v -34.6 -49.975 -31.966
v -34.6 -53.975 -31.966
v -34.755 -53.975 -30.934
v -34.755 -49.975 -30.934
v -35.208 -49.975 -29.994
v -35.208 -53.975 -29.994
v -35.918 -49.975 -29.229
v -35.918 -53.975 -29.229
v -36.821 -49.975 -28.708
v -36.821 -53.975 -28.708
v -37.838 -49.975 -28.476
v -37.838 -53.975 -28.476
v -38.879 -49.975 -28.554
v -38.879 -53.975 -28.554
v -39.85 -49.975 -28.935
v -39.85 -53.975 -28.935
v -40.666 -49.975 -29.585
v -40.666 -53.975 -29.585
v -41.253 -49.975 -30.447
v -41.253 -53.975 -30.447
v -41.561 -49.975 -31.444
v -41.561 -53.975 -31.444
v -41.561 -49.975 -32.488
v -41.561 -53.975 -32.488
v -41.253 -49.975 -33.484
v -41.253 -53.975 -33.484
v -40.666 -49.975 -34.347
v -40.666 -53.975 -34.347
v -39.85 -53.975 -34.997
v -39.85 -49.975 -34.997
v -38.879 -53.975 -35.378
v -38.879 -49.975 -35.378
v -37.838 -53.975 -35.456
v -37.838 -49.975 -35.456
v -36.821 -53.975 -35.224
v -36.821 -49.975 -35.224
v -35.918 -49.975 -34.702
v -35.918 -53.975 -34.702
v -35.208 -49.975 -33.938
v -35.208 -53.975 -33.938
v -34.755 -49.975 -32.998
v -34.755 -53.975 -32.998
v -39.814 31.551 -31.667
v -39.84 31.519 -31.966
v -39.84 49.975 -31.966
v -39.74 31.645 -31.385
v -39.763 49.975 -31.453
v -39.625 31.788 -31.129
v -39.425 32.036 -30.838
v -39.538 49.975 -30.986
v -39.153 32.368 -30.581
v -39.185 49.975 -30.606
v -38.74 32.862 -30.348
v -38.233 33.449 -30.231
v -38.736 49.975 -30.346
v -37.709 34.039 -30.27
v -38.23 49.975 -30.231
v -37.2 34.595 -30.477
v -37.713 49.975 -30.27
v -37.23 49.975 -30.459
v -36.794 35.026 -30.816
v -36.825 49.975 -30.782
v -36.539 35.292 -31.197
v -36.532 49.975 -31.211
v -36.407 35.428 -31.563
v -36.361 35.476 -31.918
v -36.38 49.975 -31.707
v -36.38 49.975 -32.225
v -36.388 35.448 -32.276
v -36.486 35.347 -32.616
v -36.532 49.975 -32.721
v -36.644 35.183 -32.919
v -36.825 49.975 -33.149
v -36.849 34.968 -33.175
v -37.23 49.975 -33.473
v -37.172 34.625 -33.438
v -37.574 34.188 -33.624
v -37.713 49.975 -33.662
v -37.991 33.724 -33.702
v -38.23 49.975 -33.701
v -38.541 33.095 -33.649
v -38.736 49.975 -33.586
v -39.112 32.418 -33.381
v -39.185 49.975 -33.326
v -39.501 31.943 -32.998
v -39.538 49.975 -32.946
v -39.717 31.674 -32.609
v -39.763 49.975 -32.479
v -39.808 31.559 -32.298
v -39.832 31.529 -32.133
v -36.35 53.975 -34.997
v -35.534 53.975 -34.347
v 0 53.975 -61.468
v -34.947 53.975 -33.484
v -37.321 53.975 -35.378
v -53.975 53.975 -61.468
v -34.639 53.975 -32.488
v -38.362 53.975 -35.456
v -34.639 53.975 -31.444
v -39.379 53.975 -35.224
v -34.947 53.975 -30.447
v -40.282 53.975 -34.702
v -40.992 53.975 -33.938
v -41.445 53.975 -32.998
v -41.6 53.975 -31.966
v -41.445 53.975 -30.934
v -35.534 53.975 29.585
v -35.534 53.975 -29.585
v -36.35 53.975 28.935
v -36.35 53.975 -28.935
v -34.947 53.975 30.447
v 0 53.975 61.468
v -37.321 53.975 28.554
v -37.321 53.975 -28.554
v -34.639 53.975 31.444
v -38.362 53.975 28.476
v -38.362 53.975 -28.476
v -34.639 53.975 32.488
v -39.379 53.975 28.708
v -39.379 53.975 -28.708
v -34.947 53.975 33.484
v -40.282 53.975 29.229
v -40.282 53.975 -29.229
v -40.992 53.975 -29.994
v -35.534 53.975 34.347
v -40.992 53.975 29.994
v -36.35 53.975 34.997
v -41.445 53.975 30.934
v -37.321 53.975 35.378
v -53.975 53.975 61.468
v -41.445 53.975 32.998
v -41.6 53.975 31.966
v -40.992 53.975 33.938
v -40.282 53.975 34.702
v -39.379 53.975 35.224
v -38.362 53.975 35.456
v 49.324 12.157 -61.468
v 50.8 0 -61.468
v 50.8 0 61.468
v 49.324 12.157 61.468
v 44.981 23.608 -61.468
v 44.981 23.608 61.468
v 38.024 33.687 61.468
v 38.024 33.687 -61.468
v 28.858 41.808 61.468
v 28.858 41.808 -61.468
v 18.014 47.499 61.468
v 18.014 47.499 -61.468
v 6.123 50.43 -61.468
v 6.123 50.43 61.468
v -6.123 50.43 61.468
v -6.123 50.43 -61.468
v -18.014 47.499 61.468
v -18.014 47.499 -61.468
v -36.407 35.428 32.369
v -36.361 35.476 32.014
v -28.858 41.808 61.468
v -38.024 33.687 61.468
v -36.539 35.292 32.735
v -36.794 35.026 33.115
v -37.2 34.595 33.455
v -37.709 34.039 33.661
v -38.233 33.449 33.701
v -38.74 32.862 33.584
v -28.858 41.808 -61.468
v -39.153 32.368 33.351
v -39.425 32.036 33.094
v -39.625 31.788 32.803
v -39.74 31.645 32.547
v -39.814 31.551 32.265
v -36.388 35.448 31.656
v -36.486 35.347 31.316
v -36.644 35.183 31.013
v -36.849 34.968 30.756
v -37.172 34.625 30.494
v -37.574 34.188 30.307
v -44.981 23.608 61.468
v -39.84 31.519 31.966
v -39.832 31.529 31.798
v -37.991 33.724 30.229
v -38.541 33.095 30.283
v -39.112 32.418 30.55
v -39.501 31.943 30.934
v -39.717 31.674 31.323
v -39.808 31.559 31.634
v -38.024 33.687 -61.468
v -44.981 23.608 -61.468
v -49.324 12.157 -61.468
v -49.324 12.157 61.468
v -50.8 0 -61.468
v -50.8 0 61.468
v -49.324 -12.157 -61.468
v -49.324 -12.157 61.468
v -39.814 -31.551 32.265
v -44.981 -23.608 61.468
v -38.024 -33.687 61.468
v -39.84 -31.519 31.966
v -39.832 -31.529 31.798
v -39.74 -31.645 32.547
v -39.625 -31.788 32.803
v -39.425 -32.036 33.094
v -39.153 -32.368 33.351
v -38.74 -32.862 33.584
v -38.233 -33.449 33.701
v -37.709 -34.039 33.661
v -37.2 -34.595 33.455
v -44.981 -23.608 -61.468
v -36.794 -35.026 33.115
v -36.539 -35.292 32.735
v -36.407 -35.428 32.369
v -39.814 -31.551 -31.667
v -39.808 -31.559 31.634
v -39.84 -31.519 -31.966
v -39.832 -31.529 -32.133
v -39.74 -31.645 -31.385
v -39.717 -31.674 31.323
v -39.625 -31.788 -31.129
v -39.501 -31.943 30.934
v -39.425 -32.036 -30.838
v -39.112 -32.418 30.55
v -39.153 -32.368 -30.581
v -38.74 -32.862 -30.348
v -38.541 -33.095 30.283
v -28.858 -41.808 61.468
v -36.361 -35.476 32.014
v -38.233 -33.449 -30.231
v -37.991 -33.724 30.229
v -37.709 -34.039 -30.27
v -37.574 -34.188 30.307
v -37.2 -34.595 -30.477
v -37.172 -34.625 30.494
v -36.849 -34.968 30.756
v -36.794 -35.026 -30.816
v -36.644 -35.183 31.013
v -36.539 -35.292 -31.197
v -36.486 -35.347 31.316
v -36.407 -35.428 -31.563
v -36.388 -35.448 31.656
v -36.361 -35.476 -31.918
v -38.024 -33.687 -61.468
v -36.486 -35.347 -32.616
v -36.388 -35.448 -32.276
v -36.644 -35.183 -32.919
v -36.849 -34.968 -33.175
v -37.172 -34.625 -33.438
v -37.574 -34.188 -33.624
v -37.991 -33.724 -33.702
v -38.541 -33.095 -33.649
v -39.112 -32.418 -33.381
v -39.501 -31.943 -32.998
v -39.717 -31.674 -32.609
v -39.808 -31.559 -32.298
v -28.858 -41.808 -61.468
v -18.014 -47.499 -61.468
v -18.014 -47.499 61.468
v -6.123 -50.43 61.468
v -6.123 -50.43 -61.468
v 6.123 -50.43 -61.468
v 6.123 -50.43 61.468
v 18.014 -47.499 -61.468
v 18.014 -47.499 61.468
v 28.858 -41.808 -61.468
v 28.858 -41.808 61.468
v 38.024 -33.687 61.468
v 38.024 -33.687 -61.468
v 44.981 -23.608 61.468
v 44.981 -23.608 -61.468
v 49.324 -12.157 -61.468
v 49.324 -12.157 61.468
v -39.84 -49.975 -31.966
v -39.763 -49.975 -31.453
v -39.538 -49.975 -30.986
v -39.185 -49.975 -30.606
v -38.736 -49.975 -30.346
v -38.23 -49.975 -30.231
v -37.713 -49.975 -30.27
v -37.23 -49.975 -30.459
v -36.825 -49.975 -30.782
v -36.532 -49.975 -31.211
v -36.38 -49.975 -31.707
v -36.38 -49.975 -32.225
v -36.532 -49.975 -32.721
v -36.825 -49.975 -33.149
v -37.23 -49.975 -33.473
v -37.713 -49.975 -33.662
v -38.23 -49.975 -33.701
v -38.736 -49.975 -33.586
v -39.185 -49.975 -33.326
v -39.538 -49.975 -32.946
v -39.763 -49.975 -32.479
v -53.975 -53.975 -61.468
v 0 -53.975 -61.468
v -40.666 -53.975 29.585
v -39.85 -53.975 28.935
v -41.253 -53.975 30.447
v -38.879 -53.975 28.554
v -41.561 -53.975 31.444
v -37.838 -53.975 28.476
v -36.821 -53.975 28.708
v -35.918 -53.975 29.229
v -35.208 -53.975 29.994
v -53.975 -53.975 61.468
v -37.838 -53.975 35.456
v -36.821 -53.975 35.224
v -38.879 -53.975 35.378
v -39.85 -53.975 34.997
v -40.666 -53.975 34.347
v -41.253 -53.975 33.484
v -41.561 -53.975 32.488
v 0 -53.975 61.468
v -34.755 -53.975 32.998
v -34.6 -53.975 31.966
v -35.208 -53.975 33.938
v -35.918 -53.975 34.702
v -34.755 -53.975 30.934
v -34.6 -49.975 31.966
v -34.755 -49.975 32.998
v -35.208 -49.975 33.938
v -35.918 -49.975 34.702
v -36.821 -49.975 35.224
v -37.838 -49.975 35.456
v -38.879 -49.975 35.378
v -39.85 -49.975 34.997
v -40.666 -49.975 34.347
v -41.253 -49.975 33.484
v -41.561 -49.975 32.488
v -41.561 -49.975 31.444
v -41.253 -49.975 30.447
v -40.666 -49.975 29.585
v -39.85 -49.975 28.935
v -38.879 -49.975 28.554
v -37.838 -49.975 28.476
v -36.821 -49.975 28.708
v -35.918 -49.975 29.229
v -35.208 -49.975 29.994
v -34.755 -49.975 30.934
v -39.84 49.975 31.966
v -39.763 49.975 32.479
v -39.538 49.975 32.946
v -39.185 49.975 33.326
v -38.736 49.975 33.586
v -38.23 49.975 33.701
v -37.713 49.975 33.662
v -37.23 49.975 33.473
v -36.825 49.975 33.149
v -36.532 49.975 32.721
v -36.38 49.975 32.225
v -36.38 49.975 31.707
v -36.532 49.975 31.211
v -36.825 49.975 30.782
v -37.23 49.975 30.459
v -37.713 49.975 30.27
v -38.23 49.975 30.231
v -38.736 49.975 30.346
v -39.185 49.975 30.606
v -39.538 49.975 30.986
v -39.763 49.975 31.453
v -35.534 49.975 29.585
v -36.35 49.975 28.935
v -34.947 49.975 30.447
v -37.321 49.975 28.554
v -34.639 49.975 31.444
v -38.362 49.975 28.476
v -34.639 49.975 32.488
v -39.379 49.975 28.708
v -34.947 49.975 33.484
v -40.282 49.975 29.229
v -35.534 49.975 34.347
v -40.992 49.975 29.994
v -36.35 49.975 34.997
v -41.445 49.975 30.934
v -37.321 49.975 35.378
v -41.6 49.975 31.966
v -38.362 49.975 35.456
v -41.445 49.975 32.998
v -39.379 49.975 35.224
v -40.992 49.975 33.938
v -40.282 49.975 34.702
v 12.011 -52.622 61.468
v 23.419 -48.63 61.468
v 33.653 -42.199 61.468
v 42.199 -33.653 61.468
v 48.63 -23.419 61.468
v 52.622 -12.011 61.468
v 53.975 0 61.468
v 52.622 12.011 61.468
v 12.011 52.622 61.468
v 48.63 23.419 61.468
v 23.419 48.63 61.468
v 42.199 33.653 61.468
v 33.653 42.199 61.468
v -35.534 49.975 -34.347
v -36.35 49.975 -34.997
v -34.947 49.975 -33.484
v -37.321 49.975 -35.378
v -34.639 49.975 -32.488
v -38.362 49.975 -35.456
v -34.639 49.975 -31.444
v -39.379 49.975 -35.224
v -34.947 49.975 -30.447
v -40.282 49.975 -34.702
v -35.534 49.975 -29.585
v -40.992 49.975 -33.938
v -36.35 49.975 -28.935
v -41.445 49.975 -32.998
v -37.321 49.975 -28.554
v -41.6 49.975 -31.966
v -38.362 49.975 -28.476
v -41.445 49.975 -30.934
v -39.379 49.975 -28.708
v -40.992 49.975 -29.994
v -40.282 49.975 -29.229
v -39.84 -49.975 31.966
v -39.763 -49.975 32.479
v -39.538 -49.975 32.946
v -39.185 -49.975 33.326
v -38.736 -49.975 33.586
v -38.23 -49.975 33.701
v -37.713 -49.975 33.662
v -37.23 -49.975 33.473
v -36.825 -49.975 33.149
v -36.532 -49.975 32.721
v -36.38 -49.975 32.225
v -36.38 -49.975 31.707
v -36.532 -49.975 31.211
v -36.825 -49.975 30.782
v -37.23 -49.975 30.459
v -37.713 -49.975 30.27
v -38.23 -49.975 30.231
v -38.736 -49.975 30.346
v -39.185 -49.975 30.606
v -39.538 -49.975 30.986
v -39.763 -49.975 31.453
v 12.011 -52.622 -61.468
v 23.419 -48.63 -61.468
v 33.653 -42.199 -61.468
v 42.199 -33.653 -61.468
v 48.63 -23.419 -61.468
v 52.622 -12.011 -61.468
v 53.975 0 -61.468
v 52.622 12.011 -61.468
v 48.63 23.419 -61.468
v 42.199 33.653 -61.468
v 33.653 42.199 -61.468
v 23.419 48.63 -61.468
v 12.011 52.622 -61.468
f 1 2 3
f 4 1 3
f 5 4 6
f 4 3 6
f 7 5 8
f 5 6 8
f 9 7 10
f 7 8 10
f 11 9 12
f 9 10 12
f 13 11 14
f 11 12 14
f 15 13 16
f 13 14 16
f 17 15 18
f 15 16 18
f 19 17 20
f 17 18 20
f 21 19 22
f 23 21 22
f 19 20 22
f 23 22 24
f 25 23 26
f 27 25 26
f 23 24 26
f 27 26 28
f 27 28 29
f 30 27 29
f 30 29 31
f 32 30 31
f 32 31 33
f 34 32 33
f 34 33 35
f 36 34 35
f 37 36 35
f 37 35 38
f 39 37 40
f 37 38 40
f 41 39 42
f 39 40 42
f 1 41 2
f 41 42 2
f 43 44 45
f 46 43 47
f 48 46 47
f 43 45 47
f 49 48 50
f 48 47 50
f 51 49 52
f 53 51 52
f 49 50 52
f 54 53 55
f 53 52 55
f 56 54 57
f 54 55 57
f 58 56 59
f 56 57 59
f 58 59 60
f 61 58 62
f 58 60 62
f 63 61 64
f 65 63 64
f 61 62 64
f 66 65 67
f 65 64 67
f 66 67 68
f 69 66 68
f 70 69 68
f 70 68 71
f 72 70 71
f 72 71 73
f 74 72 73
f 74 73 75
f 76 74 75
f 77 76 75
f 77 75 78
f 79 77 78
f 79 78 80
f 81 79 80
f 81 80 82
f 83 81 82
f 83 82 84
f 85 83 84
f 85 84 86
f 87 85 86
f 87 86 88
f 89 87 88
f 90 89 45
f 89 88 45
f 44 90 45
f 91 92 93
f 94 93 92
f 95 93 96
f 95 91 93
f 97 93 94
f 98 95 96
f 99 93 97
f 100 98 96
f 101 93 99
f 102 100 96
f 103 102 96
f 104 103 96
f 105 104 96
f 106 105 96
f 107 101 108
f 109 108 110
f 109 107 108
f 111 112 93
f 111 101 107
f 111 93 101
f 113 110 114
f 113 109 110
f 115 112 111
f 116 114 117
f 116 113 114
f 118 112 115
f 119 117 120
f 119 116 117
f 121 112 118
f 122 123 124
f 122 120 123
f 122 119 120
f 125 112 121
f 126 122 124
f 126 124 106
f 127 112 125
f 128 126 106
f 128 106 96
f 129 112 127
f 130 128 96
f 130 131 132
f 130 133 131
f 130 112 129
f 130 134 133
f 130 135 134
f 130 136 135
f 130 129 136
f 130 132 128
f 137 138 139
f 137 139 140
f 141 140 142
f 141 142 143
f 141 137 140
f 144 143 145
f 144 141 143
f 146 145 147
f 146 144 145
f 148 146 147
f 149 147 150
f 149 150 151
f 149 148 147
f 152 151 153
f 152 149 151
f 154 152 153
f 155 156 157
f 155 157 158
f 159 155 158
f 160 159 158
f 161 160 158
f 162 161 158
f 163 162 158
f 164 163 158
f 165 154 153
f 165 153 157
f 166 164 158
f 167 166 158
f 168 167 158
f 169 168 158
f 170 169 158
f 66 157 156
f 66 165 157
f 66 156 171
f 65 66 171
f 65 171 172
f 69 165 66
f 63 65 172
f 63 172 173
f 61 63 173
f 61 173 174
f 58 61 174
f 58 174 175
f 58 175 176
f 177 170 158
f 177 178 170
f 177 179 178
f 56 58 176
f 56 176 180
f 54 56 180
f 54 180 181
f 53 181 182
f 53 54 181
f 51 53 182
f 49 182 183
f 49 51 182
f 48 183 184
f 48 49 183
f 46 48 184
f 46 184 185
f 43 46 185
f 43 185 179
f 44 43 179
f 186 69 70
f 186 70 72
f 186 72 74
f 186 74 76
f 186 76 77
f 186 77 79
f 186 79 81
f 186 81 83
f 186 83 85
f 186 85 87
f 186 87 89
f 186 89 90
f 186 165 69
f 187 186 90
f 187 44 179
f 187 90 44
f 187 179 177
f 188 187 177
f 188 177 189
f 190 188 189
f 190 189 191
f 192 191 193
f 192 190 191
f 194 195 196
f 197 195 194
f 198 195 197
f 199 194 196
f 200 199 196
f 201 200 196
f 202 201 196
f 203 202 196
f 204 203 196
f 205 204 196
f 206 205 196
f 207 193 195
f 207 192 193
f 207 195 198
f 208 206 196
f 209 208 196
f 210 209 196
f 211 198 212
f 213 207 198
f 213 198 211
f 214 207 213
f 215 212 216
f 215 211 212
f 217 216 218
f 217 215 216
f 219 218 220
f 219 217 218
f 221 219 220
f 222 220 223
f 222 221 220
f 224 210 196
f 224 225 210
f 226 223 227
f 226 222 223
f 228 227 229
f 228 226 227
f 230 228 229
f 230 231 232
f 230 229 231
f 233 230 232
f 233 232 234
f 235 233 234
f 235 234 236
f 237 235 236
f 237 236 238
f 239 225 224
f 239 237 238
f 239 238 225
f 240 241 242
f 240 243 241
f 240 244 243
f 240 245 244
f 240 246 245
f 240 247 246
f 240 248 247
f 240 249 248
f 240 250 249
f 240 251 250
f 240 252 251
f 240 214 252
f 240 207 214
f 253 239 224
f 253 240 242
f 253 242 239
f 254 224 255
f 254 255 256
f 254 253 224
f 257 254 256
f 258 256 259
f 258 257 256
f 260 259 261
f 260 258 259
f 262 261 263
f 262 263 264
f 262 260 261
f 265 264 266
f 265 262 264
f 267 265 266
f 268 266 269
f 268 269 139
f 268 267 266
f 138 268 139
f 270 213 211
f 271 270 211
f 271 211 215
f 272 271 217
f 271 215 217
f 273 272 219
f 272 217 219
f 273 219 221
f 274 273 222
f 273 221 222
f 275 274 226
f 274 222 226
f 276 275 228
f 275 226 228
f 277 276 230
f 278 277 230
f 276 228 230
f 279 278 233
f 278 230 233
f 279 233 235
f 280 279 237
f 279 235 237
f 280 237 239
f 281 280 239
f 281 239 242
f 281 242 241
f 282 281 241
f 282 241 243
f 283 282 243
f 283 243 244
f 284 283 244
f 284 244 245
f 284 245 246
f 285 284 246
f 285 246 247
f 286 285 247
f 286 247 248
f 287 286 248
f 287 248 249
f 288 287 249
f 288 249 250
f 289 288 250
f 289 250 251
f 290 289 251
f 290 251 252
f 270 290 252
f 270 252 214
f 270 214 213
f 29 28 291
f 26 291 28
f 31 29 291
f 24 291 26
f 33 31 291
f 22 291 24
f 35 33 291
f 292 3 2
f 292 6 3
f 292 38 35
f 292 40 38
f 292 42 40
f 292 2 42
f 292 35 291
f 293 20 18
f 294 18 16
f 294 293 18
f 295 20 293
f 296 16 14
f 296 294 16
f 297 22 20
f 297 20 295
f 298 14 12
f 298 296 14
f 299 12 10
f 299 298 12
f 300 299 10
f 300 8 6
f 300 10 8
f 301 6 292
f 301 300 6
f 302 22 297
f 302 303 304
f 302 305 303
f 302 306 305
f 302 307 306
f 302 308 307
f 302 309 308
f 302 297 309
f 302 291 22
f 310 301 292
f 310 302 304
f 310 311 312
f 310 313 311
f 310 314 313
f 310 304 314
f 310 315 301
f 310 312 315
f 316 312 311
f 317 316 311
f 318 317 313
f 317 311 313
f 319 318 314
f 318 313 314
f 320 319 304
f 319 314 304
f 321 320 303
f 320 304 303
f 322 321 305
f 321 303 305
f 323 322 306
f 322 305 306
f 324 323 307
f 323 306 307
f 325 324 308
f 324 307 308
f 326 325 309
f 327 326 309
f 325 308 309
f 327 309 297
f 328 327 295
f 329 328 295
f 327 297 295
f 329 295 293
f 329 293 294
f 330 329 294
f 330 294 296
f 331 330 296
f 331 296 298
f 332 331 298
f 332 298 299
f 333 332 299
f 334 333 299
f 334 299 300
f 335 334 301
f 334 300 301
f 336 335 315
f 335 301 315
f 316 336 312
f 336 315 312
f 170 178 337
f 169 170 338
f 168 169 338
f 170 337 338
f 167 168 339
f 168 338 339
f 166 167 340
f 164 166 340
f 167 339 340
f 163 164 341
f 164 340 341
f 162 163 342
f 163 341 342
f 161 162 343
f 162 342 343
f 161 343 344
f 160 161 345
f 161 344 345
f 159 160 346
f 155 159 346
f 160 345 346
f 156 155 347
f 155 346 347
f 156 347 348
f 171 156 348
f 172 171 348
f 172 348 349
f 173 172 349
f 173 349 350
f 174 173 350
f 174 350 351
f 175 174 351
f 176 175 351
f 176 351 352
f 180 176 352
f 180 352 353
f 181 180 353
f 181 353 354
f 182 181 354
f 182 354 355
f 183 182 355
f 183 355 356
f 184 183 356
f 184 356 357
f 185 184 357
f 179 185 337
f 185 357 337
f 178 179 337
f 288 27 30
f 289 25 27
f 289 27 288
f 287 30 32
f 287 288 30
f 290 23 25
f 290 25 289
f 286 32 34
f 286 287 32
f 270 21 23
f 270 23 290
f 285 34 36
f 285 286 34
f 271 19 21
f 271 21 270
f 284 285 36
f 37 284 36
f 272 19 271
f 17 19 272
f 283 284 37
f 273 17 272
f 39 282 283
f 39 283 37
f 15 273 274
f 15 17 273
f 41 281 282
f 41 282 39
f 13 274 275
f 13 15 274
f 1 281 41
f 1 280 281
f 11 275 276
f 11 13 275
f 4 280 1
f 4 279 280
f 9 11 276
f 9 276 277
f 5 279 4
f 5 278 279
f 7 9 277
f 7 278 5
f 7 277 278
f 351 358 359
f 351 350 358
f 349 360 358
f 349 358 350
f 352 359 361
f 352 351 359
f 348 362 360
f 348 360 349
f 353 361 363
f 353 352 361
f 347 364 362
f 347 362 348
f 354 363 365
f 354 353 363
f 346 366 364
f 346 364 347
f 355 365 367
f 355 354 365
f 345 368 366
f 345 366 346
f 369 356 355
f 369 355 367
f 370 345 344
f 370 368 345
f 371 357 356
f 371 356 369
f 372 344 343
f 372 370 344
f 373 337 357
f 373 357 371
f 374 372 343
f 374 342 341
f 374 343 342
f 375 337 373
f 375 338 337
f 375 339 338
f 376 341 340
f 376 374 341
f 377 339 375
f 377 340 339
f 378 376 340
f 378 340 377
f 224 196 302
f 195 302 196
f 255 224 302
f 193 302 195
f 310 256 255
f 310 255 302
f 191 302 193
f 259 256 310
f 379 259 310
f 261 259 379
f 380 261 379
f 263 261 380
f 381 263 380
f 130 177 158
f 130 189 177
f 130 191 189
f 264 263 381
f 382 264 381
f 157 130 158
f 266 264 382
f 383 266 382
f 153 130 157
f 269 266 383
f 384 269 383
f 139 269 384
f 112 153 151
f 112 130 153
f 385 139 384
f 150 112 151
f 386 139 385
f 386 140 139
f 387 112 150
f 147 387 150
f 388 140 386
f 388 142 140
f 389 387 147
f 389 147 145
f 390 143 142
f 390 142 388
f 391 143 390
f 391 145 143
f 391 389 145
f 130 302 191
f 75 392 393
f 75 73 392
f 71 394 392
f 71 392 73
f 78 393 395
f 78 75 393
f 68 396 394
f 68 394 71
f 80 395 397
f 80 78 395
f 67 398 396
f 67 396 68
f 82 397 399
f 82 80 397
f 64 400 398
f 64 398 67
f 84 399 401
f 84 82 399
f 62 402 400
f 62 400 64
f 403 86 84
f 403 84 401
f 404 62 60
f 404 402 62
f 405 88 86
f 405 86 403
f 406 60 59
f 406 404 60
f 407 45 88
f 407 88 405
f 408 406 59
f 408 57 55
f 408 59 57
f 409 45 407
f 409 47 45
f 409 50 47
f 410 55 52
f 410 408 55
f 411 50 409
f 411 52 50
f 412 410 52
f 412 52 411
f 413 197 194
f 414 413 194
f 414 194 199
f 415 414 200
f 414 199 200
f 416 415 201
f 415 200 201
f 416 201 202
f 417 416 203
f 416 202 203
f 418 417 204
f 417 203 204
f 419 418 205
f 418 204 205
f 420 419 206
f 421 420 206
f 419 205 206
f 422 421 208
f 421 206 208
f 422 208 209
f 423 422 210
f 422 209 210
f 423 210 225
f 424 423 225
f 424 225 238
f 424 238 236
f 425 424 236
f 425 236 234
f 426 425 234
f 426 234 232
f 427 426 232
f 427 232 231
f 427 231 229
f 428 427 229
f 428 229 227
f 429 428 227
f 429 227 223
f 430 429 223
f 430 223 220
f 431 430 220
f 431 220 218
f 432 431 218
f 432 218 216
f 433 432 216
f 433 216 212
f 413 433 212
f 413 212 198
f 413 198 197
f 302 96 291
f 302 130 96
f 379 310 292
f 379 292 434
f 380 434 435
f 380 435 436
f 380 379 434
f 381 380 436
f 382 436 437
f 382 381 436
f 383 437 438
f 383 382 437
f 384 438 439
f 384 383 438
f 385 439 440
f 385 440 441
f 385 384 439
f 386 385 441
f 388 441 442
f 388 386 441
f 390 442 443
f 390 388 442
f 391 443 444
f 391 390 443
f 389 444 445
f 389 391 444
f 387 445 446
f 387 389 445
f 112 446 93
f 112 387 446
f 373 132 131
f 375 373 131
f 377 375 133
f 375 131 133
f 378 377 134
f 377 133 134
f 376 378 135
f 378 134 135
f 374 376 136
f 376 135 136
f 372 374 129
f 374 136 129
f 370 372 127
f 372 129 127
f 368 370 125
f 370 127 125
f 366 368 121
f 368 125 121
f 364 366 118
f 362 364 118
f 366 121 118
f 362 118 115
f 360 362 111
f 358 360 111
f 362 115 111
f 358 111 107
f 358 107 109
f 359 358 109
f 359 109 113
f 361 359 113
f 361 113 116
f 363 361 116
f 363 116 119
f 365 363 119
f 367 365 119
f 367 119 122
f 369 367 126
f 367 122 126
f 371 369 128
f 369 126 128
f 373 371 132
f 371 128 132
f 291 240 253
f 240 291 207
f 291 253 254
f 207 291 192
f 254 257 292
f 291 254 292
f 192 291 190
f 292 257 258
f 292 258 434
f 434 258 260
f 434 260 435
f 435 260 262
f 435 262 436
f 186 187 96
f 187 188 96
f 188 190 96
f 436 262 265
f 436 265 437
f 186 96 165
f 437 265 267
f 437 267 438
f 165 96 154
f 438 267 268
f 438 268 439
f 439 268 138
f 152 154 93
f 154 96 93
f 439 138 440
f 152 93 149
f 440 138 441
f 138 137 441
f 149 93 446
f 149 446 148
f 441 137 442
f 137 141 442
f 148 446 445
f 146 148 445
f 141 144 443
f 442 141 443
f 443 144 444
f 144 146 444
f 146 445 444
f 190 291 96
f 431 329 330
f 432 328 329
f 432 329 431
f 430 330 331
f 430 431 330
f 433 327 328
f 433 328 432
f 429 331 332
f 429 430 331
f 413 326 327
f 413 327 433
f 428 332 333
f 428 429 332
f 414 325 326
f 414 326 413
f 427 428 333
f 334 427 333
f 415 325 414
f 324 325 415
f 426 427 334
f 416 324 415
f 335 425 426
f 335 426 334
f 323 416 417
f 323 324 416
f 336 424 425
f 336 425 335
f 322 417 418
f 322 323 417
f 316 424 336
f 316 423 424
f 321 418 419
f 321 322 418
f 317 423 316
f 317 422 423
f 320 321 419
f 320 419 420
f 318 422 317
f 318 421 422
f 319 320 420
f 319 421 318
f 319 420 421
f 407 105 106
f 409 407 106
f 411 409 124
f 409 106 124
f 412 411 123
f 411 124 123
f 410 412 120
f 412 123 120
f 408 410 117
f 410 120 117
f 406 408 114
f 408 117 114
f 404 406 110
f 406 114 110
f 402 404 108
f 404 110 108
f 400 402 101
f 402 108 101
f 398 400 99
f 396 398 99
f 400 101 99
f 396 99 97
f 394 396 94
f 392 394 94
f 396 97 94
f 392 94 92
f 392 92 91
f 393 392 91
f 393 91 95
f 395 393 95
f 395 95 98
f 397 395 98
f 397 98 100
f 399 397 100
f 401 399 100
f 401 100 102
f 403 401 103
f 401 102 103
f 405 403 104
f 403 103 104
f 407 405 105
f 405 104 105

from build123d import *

# Parameters (mm, degrees)
F0_R     = 50.8
F1_DEPTH = 61.468
F2_R     = 1.7399
F3_DEPTH = 304.8
F4_R     = 3.5
F5_DEPTH = 4
F6_R     = 3.5
F7_DEPTH = 4


with BuildPart() as f1:
    # F0 (on Top) → F1 (new body, symmetric)
    with BuildSketch(Plane.XY):
        with BuildLine():
            Line((-53.975, -53.975), (0, -53.975))
            ThreePointArc((0, -53.975), (53.975, 0), (0, 53.975))
            Line((0, 53.975), (-53.975, 53.975))
            Line((-53.975, 53.975), (-53.975, -53.975))
        make_face()
        Circle(F0_R, mode=Mode.SUBTRACT)
    extrude(amount=F1_DEPTH, both=True)

    # F2 (on face) → F3 (cut)
    with BuildSketch(Plane(origin=(0, 53.975, 0), x_dir=(-1, 0, 0), z_dir=(0, 1, 0))):
        with Locations((38.1, 31.9659)):
            Circle(F2_R)
        with Locations((38.1, -31.9659)):
            Circle(F2_R)
    extrude(amount=-F3_DEPTH, mode=Mode.SUBTRACT)

    # F4 (on face) → F5 (cut)
    with BuildSketch(Plane.XZ.offset(53.975)):
        with Locations((-38.1, 31.9659)):
            Circle(F4_R)
        with Locations((-38.1, -31.9659)):
            Circle(F4_R)
    extrude(amount=-F5_DEPTH, mode=Mode.SUBTRACT)

    # F6 (on face) → F7 (cut)
    with BuildSketch(Plane(origin=(0, 53.975, 0), x_dir=(-1, 0, 0), z_dir=(0, 1, 0))):
        with Locations((38.1, 31.9659)):
            Circle(F6_R)
        with Locations((38.1, -31.9659)):
            Circle(F6_R)
    extrude(amount=-F7_DEPTH, mode=Mode.SUBTRACT)


solid = f1.part
